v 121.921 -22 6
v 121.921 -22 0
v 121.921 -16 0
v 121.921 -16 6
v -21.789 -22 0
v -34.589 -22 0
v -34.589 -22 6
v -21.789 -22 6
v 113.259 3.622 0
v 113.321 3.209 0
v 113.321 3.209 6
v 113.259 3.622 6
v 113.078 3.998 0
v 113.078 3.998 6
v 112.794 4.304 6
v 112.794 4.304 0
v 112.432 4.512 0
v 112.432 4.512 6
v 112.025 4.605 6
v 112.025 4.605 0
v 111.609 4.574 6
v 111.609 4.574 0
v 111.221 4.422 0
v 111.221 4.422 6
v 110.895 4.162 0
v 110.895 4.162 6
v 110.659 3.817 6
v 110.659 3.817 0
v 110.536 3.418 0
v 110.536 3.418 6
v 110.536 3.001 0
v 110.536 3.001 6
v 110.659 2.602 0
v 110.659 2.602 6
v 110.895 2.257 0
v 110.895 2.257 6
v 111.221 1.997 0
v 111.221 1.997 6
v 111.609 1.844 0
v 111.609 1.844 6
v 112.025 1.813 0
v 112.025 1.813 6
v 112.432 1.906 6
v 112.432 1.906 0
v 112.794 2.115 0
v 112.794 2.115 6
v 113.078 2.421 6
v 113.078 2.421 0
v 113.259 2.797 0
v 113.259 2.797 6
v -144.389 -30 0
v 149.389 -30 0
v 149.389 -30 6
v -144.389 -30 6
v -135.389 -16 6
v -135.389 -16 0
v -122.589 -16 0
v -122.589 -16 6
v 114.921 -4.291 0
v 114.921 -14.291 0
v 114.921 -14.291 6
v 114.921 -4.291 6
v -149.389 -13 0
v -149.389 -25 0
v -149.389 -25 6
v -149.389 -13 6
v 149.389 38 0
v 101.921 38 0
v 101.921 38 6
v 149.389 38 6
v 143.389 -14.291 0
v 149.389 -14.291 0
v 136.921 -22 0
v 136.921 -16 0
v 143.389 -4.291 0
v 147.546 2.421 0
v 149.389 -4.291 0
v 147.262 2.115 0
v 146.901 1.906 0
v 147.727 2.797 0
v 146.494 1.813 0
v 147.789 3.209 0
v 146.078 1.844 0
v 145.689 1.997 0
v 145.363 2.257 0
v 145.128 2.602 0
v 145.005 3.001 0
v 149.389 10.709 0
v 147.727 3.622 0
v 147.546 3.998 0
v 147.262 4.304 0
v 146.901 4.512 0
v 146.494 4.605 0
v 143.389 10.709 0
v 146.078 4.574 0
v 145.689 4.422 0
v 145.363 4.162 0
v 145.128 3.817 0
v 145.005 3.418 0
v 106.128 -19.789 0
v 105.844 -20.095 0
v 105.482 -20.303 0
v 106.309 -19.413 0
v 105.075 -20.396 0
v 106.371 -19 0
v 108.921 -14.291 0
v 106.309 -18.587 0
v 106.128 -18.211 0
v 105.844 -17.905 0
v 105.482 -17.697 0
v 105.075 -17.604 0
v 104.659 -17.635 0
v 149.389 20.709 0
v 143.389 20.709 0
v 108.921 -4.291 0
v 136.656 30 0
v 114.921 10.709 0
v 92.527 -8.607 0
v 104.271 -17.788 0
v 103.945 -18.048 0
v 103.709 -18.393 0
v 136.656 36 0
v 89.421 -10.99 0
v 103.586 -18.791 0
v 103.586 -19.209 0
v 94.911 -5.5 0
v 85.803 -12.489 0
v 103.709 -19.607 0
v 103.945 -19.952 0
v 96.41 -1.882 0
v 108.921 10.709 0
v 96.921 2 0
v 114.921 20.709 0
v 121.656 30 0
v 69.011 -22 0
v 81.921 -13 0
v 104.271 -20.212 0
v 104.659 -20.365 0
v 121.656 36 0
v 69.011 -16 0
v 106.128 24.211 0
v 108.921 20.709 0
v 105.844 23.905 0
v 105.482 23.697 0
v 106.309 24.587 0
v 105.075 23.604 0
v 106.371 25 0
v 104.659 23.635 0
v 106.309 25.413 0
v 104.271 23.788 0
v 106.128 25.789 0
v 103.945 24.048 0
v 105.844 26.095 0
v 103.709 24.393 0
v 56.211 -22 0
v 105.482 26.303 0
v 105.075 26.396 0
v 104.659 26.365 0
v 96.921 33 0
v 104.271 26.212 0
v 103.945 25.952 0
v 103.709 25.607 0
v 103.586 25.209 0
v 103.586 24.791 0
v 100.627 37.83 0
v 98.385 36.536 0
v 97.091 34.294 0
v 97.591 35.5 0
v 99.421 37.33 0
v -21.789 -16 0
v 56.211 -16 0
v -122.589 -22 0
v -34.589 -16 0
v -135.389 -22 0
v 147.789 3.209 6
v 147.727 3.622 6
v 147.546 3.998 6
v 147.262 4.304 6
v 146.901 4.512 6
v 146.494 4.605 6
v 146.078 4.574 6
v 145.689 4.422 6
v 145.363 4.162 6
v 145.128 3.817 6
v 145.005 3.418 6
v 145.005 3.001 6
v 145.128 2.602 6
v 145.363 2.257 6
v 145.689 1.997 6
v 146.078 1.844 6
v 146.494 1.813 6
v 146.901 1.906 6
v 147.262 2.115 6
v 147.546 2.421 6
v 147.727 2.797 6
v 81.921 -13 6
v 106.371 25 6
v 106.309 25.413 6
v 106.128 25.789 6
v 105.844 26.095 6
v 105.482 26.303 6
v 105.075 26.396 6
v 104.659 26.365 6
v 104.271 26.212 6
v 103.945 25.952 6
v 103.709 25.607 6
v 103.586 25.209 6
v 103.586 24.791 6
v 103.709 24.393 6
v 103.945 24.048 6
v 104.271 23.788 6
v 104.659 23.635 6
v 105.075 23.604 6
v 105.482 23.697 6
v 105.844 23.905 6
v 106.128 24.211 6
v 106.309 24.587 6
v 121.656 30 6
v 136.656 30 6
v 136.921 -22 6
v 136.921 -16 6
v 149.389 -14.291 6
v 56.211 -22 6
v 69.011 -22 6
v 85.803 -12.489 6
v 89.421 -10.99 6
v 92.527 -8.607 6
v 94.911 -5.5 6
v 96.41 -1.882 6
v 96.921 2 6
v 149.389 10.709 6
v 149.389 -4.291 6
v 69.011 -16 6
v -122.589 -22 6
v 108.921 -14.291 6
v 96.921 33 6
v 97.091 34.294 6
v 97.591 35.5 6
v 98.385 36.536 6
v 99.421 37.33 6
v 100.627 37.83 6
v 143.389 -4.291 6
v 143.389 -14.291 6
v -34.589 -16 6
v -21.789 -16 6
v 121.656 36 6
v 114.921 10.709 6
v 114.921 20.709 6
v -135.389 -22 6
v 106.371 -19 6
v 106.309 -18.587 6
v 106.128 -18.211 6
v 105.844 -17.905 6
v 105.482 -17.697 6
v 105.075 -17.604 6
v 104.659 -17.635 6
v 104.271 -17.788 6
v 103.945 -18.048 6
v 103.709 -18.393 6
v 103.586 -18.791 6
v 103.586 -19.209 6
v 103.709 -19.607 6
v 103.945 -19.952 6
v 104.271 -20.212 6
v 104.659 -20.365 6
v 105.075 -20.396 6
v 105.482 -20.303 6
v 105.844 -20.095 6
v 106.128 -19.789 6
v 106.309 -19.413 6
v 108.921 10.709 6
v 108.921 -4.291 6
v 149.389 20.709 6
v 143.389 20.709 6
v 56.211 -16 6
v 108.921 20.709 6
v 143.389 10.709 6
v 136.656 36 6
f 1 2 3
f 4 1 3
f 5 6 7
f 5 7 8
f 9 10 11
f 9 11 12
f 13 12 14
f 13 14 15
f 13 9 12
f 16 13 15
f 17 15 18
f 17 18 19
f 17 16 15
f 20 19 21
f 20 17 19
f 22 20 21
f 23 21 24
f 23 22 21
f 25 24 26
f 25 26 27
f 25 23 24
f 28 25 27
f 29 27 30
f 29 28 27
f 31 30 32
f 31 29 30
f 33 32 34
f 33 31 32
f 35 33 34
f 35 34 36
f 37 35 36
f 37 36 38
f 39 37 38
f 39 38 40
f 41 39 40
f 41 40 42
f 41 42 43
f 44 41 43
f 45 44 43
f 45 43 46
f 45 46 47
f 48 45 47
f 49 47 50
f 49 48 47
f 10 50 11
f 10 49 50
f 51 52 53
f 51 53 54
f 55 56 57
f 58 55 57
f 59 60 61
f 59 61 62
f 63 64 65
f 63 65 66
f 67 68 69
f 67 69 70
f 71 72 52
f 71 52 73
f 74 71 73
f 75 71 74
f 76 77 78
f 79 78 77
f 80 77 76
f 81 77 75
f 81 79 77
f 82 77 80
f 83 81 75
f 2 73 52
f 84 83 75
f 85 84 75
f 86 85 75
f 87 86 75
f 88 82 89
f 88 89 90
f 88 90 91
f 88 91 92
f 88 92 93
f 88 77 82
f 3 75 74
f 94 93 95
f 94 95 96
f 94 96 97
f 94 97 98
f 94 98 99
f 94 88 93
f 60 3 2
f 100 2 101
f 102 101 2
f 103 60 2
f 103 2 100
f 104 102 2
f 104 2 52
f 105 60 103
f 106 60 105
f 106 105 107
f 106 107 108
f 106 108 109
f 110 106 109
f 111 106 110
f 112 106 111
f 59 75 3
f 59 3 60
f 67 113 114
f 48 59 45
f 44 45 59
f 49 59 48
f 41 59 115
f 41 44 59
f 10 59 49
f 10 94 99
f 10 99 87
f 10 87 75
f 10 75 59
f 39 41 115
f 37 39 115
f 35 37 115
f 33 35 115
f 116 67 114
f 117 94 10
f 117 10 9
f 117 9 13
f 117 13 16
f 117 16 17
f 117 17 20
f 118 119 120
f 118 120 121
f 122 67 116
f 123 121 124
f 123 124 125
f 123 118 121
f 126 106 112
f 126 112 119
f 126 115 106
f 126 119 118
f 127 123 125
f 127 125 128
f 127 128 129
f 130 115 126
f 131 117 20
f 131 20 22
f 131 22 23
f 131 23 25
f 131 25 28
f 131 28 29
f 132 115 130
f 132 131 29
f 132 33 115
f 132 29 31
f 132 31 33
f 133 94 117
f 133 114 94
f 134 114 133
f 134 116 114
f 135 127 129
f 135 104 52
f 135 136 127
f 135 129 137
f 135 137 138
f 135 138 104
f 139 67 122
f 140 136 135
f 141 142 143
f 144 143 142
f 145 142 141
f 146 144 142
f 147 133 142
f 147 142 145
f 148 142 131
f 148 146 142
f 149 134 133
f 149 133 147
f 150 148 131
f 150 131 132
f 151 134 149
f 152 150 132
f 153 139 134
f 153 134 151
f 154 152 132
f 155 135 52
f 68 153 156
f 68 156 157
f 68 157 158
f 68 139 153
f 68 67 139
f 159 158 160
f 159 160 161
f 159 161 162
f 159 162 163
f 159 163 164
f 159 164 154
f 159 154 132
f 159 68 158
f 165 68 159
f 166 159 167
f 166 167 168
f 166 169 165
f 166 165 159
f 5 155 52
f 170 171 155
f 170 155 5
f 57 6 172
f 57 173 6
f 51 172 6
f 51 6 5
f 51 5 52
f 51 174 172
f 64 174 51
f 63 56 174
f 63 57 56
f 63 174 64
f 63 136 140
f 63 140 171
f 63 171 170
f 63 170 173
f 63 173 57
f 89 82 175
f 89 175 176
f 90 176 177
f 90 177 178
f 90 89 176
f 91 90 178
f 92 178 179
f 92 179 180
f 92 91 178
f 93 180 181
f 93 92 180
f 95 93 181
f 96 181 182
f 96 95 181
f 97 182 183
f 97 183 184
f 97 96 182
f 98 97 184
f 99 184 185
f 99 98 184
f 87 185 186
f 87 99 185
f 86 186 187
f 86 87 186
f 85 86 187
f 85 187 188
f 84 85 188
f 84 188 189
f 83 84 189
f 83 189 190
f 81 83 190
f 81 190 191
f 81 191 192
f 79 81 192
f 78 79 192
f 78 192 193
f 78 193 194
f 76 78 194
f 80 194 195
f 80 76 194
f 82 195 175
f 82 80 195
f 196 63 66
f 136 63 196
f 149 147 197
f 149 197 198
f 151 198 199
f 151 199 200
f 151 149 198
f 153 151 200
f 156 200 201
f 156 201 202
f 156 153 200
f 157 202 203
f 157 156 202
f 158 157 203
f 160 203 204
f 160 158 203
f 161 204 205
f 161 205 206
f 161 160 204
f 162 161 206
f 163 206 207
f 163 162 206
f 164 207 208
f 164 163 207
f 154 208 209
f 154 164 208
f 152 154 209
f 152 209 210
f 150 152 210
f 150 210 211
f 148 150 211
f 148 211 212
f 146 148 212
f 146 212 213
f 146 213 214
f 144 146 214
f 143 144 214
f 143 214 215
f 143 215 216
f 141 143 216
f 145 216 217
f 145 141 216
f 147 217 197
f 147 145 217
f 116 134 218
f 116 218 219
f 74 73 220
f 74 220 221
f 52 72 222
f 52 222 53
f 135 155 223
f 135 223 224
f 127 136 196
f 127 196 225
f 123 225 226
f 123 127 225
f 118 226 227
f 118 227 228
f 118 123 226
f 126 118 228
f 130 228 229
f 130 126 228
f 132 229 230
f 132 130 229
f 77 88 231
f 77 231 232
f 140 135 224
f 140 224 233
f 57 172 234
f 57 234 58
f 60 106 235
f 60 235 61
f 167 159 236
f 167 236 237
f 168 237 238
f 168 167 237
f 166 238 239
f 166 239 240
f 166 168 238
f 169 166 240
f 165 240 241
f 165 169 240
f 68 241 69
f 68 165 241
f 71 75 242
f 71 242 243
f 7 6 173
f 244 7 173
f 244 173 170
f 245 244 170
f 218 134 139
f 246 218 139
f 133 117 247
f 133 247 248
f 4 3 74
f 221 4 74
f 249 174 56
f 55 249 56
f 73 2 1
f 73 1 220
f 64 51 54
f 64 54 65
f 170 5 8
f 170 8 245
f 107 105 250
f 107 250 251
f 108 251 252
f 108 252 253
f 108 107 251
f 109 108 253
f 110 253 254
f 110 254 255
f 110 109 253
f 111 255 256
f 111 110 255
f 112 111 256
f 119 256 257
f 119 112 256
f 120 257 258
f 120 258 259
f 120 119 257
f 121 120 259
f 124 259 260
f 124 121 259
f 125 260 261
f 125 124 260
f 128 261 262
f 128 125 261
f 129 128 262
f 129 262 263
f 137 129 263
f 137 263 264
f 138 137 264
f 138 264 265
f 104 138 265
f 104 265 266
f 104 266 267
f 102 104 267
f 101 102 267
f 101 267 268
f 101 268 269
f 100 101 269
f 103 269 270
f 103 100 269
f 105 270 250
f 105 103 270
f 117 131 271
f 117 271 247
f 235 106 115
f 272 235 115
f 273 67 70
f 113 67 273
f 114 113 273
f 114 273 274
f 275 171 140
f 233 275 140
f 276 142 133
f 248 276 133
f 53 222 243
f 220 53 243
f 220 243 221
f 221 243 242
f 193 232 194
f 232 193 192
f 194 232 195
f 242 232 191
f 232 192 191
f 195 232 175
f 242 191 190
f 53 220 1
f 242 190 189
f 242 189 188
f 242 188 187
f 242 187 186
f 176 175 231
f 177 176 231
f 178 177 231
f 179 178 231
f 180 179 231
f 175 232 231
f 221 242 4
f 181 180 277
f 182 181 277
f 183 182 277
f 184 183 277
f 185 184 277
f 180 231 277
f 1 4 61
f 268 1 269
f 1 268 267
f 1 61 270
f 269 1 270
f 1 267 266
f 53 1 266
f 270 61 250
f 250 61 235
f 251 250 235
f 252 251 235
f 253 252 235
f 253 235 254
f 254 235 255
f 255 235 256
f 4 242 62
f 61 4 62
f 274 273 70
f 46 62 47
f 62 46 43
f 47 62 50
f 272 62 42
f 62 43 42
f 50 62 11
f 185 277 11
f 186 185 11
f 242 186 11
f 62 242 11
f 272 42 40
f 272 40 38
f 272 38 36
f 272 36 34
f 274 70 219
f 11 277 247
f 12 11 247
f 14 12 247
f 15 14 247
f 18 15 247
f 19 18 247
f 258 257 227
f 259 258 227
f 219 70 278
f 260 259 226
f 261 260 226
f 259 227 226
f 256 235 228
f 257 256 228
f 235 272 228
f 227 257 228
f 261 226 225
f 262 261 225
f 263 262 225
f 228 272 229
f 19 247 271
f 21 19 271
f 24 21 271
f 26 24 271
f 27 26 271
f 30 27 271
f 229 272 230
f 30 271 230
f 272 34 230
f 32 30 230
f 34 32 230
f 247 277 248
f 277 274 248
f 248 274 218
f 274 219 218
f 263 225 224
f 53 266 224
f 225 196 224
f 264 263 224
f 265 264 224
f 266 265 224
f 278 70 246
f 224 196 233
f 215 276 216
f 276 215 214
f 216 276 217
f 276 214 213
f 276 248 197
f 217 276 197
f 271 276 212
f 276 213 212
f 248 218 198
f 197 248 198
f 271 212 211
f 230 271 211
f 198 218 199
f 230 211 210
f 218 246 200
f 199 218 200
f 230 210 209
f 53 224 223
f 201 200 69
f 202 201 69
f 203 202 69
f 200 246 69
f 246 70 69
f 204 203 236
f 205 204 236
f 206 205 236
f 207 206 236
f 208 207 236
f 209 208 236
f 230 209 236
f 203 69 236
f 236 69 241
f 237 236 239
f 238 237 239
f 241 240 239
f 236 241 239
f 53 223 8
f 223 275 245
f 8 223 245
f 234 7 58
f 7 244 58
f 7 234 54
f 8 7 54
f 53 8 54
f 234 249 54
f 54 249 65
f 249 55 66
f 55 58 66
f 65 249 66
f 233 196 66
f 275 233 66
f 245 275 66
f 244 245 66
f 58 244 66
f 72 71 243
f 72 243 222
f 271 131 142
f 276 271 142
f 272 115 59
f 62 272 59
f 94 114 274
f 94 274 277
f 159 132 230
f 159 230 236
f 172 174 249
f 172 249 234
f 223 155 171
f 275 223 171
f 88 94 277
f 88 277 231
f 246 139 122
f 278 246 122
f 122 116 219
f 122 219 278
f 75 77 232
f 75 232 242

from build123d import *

# Parameters (mm, degrees)
SKETCH_1_R      = 1.4
SKETCH_1_W      = 12.8
SKETCH_1_H      = 6
SKETCH_1_W_2    = 15
SKETCH_1_W_3    = 6
SKETCH_1_H_2    = 10
EXTRUDE_1_DEPTH = 6


with BuildPart() as part:
    # Эскиз1 → Бобышка-Вытянуть1 (new body)
    with BuildSketch(Plane.XY):
        with BuildLine():
            Line((96.920798757, 2), (96.920798757, 25))
            Line((96.920798757, 25), (96.920798757, 33))
            ThreePointArc((96.920798757, 33), (98.385264851, 36.535533906), (101.920798757, 38))
            Line((101.920798757, 38), (149.389201243, 38))
            Line((149.389201243, 38), (149.389201243, 30))
            Line((149.389201243, 30), (149.389201243, 20.709265489))
            Line((149.389201243, 20.709265489), (143.389201243, 20.709265489))
            Line((143.389201243, 20.709265489), (143.389201243, 10.709265489))
            Line((143.389201243, 10.709265489), (149.389201243, 10.709265489))
            Line((149.389201243, 10.709265489), (149.389201243, -4.290734511))
            Line((149.389201243, -4.290734511), (143.389201243, -4.290734511))
            Line((143.389201243, -4.290734511), (143.389201243, -14.290734511))
            Line((143.389201243, -14.290734511), (149.389201243, -14.290734511))
            Line((149.389201243, -14.290734511), (149.389201243, -30))
            Line((149.389201243, -30), (-144.389201243, -30))
            Line((-144.389201243, -30), (-149.389201243, -25))
            Line((-149.389201243, -25), (-149.389201243, -13))
            Line((-149.389201243, -13), (81.920798757, -13))
            ThreePointArc((81.920798757, -13), (92.527400475, -8.606601718), (96.920798757, 2))
        make_face()
        with Locations((104.970798757, -19)):
            Circle(SKETCH_1_R, mode=Mode.SUBTRACT)
        with Locations((104.970798757, 25)):
            Circle(SKETCH_1_R, mode=Mode.SUBTRACT)
        with Locations((111.920798757, 3.209265489)):
            Circle(SKETCH_1_R, mode=Mode.SUBTRACT)
        with Locations((146.389201243, 3.209265489)):
            Circle(SKETCH_1_R, mode=Mode.SUBTRACT)
        with Locations((-128.98858016, -19)):
            Rectangle(SKETCH_1_W, SKETCH_1_H, mode=Mode.SUBTRACT)
        with Locations((-28.18858016, -19)):
            Rectangle(SKETCH_1_W, SKETCH_1_H, mode=Mode.SUBTRACT)
        with Locations((62.61141984, -19)):
            Rectangle(SKETCH_1_W, SKETCH_1_H, mode=Mode.SUBTRACT)
        with Locations((129.420798757, -19)):
            Rectangle(SKETCH_1_W_2, SKETCH_1_H, mode=Mode.SUBTRACT)
        with Locations((111.920798757, 15.709265489)):
            Rectangle(SKETCH_1_W_3, SKETCH_1_H_2, mode=Mode.SUBTRACT)
        with Locations((111.920798757, -9.290734511)):
            Rectangle(SKETCH_1_W_3, SKETCH_1_H_2, mode=Mode.SUBTRACT)
        with Locations((129.155798757, 33)):
            Rectangle(SKETCH_1_W_2, SKETCH_1_H, mode=Mode.SUBTRACT)
    extrude(amount=EXTRUDE_1_DEPTH)


solid = part.part
